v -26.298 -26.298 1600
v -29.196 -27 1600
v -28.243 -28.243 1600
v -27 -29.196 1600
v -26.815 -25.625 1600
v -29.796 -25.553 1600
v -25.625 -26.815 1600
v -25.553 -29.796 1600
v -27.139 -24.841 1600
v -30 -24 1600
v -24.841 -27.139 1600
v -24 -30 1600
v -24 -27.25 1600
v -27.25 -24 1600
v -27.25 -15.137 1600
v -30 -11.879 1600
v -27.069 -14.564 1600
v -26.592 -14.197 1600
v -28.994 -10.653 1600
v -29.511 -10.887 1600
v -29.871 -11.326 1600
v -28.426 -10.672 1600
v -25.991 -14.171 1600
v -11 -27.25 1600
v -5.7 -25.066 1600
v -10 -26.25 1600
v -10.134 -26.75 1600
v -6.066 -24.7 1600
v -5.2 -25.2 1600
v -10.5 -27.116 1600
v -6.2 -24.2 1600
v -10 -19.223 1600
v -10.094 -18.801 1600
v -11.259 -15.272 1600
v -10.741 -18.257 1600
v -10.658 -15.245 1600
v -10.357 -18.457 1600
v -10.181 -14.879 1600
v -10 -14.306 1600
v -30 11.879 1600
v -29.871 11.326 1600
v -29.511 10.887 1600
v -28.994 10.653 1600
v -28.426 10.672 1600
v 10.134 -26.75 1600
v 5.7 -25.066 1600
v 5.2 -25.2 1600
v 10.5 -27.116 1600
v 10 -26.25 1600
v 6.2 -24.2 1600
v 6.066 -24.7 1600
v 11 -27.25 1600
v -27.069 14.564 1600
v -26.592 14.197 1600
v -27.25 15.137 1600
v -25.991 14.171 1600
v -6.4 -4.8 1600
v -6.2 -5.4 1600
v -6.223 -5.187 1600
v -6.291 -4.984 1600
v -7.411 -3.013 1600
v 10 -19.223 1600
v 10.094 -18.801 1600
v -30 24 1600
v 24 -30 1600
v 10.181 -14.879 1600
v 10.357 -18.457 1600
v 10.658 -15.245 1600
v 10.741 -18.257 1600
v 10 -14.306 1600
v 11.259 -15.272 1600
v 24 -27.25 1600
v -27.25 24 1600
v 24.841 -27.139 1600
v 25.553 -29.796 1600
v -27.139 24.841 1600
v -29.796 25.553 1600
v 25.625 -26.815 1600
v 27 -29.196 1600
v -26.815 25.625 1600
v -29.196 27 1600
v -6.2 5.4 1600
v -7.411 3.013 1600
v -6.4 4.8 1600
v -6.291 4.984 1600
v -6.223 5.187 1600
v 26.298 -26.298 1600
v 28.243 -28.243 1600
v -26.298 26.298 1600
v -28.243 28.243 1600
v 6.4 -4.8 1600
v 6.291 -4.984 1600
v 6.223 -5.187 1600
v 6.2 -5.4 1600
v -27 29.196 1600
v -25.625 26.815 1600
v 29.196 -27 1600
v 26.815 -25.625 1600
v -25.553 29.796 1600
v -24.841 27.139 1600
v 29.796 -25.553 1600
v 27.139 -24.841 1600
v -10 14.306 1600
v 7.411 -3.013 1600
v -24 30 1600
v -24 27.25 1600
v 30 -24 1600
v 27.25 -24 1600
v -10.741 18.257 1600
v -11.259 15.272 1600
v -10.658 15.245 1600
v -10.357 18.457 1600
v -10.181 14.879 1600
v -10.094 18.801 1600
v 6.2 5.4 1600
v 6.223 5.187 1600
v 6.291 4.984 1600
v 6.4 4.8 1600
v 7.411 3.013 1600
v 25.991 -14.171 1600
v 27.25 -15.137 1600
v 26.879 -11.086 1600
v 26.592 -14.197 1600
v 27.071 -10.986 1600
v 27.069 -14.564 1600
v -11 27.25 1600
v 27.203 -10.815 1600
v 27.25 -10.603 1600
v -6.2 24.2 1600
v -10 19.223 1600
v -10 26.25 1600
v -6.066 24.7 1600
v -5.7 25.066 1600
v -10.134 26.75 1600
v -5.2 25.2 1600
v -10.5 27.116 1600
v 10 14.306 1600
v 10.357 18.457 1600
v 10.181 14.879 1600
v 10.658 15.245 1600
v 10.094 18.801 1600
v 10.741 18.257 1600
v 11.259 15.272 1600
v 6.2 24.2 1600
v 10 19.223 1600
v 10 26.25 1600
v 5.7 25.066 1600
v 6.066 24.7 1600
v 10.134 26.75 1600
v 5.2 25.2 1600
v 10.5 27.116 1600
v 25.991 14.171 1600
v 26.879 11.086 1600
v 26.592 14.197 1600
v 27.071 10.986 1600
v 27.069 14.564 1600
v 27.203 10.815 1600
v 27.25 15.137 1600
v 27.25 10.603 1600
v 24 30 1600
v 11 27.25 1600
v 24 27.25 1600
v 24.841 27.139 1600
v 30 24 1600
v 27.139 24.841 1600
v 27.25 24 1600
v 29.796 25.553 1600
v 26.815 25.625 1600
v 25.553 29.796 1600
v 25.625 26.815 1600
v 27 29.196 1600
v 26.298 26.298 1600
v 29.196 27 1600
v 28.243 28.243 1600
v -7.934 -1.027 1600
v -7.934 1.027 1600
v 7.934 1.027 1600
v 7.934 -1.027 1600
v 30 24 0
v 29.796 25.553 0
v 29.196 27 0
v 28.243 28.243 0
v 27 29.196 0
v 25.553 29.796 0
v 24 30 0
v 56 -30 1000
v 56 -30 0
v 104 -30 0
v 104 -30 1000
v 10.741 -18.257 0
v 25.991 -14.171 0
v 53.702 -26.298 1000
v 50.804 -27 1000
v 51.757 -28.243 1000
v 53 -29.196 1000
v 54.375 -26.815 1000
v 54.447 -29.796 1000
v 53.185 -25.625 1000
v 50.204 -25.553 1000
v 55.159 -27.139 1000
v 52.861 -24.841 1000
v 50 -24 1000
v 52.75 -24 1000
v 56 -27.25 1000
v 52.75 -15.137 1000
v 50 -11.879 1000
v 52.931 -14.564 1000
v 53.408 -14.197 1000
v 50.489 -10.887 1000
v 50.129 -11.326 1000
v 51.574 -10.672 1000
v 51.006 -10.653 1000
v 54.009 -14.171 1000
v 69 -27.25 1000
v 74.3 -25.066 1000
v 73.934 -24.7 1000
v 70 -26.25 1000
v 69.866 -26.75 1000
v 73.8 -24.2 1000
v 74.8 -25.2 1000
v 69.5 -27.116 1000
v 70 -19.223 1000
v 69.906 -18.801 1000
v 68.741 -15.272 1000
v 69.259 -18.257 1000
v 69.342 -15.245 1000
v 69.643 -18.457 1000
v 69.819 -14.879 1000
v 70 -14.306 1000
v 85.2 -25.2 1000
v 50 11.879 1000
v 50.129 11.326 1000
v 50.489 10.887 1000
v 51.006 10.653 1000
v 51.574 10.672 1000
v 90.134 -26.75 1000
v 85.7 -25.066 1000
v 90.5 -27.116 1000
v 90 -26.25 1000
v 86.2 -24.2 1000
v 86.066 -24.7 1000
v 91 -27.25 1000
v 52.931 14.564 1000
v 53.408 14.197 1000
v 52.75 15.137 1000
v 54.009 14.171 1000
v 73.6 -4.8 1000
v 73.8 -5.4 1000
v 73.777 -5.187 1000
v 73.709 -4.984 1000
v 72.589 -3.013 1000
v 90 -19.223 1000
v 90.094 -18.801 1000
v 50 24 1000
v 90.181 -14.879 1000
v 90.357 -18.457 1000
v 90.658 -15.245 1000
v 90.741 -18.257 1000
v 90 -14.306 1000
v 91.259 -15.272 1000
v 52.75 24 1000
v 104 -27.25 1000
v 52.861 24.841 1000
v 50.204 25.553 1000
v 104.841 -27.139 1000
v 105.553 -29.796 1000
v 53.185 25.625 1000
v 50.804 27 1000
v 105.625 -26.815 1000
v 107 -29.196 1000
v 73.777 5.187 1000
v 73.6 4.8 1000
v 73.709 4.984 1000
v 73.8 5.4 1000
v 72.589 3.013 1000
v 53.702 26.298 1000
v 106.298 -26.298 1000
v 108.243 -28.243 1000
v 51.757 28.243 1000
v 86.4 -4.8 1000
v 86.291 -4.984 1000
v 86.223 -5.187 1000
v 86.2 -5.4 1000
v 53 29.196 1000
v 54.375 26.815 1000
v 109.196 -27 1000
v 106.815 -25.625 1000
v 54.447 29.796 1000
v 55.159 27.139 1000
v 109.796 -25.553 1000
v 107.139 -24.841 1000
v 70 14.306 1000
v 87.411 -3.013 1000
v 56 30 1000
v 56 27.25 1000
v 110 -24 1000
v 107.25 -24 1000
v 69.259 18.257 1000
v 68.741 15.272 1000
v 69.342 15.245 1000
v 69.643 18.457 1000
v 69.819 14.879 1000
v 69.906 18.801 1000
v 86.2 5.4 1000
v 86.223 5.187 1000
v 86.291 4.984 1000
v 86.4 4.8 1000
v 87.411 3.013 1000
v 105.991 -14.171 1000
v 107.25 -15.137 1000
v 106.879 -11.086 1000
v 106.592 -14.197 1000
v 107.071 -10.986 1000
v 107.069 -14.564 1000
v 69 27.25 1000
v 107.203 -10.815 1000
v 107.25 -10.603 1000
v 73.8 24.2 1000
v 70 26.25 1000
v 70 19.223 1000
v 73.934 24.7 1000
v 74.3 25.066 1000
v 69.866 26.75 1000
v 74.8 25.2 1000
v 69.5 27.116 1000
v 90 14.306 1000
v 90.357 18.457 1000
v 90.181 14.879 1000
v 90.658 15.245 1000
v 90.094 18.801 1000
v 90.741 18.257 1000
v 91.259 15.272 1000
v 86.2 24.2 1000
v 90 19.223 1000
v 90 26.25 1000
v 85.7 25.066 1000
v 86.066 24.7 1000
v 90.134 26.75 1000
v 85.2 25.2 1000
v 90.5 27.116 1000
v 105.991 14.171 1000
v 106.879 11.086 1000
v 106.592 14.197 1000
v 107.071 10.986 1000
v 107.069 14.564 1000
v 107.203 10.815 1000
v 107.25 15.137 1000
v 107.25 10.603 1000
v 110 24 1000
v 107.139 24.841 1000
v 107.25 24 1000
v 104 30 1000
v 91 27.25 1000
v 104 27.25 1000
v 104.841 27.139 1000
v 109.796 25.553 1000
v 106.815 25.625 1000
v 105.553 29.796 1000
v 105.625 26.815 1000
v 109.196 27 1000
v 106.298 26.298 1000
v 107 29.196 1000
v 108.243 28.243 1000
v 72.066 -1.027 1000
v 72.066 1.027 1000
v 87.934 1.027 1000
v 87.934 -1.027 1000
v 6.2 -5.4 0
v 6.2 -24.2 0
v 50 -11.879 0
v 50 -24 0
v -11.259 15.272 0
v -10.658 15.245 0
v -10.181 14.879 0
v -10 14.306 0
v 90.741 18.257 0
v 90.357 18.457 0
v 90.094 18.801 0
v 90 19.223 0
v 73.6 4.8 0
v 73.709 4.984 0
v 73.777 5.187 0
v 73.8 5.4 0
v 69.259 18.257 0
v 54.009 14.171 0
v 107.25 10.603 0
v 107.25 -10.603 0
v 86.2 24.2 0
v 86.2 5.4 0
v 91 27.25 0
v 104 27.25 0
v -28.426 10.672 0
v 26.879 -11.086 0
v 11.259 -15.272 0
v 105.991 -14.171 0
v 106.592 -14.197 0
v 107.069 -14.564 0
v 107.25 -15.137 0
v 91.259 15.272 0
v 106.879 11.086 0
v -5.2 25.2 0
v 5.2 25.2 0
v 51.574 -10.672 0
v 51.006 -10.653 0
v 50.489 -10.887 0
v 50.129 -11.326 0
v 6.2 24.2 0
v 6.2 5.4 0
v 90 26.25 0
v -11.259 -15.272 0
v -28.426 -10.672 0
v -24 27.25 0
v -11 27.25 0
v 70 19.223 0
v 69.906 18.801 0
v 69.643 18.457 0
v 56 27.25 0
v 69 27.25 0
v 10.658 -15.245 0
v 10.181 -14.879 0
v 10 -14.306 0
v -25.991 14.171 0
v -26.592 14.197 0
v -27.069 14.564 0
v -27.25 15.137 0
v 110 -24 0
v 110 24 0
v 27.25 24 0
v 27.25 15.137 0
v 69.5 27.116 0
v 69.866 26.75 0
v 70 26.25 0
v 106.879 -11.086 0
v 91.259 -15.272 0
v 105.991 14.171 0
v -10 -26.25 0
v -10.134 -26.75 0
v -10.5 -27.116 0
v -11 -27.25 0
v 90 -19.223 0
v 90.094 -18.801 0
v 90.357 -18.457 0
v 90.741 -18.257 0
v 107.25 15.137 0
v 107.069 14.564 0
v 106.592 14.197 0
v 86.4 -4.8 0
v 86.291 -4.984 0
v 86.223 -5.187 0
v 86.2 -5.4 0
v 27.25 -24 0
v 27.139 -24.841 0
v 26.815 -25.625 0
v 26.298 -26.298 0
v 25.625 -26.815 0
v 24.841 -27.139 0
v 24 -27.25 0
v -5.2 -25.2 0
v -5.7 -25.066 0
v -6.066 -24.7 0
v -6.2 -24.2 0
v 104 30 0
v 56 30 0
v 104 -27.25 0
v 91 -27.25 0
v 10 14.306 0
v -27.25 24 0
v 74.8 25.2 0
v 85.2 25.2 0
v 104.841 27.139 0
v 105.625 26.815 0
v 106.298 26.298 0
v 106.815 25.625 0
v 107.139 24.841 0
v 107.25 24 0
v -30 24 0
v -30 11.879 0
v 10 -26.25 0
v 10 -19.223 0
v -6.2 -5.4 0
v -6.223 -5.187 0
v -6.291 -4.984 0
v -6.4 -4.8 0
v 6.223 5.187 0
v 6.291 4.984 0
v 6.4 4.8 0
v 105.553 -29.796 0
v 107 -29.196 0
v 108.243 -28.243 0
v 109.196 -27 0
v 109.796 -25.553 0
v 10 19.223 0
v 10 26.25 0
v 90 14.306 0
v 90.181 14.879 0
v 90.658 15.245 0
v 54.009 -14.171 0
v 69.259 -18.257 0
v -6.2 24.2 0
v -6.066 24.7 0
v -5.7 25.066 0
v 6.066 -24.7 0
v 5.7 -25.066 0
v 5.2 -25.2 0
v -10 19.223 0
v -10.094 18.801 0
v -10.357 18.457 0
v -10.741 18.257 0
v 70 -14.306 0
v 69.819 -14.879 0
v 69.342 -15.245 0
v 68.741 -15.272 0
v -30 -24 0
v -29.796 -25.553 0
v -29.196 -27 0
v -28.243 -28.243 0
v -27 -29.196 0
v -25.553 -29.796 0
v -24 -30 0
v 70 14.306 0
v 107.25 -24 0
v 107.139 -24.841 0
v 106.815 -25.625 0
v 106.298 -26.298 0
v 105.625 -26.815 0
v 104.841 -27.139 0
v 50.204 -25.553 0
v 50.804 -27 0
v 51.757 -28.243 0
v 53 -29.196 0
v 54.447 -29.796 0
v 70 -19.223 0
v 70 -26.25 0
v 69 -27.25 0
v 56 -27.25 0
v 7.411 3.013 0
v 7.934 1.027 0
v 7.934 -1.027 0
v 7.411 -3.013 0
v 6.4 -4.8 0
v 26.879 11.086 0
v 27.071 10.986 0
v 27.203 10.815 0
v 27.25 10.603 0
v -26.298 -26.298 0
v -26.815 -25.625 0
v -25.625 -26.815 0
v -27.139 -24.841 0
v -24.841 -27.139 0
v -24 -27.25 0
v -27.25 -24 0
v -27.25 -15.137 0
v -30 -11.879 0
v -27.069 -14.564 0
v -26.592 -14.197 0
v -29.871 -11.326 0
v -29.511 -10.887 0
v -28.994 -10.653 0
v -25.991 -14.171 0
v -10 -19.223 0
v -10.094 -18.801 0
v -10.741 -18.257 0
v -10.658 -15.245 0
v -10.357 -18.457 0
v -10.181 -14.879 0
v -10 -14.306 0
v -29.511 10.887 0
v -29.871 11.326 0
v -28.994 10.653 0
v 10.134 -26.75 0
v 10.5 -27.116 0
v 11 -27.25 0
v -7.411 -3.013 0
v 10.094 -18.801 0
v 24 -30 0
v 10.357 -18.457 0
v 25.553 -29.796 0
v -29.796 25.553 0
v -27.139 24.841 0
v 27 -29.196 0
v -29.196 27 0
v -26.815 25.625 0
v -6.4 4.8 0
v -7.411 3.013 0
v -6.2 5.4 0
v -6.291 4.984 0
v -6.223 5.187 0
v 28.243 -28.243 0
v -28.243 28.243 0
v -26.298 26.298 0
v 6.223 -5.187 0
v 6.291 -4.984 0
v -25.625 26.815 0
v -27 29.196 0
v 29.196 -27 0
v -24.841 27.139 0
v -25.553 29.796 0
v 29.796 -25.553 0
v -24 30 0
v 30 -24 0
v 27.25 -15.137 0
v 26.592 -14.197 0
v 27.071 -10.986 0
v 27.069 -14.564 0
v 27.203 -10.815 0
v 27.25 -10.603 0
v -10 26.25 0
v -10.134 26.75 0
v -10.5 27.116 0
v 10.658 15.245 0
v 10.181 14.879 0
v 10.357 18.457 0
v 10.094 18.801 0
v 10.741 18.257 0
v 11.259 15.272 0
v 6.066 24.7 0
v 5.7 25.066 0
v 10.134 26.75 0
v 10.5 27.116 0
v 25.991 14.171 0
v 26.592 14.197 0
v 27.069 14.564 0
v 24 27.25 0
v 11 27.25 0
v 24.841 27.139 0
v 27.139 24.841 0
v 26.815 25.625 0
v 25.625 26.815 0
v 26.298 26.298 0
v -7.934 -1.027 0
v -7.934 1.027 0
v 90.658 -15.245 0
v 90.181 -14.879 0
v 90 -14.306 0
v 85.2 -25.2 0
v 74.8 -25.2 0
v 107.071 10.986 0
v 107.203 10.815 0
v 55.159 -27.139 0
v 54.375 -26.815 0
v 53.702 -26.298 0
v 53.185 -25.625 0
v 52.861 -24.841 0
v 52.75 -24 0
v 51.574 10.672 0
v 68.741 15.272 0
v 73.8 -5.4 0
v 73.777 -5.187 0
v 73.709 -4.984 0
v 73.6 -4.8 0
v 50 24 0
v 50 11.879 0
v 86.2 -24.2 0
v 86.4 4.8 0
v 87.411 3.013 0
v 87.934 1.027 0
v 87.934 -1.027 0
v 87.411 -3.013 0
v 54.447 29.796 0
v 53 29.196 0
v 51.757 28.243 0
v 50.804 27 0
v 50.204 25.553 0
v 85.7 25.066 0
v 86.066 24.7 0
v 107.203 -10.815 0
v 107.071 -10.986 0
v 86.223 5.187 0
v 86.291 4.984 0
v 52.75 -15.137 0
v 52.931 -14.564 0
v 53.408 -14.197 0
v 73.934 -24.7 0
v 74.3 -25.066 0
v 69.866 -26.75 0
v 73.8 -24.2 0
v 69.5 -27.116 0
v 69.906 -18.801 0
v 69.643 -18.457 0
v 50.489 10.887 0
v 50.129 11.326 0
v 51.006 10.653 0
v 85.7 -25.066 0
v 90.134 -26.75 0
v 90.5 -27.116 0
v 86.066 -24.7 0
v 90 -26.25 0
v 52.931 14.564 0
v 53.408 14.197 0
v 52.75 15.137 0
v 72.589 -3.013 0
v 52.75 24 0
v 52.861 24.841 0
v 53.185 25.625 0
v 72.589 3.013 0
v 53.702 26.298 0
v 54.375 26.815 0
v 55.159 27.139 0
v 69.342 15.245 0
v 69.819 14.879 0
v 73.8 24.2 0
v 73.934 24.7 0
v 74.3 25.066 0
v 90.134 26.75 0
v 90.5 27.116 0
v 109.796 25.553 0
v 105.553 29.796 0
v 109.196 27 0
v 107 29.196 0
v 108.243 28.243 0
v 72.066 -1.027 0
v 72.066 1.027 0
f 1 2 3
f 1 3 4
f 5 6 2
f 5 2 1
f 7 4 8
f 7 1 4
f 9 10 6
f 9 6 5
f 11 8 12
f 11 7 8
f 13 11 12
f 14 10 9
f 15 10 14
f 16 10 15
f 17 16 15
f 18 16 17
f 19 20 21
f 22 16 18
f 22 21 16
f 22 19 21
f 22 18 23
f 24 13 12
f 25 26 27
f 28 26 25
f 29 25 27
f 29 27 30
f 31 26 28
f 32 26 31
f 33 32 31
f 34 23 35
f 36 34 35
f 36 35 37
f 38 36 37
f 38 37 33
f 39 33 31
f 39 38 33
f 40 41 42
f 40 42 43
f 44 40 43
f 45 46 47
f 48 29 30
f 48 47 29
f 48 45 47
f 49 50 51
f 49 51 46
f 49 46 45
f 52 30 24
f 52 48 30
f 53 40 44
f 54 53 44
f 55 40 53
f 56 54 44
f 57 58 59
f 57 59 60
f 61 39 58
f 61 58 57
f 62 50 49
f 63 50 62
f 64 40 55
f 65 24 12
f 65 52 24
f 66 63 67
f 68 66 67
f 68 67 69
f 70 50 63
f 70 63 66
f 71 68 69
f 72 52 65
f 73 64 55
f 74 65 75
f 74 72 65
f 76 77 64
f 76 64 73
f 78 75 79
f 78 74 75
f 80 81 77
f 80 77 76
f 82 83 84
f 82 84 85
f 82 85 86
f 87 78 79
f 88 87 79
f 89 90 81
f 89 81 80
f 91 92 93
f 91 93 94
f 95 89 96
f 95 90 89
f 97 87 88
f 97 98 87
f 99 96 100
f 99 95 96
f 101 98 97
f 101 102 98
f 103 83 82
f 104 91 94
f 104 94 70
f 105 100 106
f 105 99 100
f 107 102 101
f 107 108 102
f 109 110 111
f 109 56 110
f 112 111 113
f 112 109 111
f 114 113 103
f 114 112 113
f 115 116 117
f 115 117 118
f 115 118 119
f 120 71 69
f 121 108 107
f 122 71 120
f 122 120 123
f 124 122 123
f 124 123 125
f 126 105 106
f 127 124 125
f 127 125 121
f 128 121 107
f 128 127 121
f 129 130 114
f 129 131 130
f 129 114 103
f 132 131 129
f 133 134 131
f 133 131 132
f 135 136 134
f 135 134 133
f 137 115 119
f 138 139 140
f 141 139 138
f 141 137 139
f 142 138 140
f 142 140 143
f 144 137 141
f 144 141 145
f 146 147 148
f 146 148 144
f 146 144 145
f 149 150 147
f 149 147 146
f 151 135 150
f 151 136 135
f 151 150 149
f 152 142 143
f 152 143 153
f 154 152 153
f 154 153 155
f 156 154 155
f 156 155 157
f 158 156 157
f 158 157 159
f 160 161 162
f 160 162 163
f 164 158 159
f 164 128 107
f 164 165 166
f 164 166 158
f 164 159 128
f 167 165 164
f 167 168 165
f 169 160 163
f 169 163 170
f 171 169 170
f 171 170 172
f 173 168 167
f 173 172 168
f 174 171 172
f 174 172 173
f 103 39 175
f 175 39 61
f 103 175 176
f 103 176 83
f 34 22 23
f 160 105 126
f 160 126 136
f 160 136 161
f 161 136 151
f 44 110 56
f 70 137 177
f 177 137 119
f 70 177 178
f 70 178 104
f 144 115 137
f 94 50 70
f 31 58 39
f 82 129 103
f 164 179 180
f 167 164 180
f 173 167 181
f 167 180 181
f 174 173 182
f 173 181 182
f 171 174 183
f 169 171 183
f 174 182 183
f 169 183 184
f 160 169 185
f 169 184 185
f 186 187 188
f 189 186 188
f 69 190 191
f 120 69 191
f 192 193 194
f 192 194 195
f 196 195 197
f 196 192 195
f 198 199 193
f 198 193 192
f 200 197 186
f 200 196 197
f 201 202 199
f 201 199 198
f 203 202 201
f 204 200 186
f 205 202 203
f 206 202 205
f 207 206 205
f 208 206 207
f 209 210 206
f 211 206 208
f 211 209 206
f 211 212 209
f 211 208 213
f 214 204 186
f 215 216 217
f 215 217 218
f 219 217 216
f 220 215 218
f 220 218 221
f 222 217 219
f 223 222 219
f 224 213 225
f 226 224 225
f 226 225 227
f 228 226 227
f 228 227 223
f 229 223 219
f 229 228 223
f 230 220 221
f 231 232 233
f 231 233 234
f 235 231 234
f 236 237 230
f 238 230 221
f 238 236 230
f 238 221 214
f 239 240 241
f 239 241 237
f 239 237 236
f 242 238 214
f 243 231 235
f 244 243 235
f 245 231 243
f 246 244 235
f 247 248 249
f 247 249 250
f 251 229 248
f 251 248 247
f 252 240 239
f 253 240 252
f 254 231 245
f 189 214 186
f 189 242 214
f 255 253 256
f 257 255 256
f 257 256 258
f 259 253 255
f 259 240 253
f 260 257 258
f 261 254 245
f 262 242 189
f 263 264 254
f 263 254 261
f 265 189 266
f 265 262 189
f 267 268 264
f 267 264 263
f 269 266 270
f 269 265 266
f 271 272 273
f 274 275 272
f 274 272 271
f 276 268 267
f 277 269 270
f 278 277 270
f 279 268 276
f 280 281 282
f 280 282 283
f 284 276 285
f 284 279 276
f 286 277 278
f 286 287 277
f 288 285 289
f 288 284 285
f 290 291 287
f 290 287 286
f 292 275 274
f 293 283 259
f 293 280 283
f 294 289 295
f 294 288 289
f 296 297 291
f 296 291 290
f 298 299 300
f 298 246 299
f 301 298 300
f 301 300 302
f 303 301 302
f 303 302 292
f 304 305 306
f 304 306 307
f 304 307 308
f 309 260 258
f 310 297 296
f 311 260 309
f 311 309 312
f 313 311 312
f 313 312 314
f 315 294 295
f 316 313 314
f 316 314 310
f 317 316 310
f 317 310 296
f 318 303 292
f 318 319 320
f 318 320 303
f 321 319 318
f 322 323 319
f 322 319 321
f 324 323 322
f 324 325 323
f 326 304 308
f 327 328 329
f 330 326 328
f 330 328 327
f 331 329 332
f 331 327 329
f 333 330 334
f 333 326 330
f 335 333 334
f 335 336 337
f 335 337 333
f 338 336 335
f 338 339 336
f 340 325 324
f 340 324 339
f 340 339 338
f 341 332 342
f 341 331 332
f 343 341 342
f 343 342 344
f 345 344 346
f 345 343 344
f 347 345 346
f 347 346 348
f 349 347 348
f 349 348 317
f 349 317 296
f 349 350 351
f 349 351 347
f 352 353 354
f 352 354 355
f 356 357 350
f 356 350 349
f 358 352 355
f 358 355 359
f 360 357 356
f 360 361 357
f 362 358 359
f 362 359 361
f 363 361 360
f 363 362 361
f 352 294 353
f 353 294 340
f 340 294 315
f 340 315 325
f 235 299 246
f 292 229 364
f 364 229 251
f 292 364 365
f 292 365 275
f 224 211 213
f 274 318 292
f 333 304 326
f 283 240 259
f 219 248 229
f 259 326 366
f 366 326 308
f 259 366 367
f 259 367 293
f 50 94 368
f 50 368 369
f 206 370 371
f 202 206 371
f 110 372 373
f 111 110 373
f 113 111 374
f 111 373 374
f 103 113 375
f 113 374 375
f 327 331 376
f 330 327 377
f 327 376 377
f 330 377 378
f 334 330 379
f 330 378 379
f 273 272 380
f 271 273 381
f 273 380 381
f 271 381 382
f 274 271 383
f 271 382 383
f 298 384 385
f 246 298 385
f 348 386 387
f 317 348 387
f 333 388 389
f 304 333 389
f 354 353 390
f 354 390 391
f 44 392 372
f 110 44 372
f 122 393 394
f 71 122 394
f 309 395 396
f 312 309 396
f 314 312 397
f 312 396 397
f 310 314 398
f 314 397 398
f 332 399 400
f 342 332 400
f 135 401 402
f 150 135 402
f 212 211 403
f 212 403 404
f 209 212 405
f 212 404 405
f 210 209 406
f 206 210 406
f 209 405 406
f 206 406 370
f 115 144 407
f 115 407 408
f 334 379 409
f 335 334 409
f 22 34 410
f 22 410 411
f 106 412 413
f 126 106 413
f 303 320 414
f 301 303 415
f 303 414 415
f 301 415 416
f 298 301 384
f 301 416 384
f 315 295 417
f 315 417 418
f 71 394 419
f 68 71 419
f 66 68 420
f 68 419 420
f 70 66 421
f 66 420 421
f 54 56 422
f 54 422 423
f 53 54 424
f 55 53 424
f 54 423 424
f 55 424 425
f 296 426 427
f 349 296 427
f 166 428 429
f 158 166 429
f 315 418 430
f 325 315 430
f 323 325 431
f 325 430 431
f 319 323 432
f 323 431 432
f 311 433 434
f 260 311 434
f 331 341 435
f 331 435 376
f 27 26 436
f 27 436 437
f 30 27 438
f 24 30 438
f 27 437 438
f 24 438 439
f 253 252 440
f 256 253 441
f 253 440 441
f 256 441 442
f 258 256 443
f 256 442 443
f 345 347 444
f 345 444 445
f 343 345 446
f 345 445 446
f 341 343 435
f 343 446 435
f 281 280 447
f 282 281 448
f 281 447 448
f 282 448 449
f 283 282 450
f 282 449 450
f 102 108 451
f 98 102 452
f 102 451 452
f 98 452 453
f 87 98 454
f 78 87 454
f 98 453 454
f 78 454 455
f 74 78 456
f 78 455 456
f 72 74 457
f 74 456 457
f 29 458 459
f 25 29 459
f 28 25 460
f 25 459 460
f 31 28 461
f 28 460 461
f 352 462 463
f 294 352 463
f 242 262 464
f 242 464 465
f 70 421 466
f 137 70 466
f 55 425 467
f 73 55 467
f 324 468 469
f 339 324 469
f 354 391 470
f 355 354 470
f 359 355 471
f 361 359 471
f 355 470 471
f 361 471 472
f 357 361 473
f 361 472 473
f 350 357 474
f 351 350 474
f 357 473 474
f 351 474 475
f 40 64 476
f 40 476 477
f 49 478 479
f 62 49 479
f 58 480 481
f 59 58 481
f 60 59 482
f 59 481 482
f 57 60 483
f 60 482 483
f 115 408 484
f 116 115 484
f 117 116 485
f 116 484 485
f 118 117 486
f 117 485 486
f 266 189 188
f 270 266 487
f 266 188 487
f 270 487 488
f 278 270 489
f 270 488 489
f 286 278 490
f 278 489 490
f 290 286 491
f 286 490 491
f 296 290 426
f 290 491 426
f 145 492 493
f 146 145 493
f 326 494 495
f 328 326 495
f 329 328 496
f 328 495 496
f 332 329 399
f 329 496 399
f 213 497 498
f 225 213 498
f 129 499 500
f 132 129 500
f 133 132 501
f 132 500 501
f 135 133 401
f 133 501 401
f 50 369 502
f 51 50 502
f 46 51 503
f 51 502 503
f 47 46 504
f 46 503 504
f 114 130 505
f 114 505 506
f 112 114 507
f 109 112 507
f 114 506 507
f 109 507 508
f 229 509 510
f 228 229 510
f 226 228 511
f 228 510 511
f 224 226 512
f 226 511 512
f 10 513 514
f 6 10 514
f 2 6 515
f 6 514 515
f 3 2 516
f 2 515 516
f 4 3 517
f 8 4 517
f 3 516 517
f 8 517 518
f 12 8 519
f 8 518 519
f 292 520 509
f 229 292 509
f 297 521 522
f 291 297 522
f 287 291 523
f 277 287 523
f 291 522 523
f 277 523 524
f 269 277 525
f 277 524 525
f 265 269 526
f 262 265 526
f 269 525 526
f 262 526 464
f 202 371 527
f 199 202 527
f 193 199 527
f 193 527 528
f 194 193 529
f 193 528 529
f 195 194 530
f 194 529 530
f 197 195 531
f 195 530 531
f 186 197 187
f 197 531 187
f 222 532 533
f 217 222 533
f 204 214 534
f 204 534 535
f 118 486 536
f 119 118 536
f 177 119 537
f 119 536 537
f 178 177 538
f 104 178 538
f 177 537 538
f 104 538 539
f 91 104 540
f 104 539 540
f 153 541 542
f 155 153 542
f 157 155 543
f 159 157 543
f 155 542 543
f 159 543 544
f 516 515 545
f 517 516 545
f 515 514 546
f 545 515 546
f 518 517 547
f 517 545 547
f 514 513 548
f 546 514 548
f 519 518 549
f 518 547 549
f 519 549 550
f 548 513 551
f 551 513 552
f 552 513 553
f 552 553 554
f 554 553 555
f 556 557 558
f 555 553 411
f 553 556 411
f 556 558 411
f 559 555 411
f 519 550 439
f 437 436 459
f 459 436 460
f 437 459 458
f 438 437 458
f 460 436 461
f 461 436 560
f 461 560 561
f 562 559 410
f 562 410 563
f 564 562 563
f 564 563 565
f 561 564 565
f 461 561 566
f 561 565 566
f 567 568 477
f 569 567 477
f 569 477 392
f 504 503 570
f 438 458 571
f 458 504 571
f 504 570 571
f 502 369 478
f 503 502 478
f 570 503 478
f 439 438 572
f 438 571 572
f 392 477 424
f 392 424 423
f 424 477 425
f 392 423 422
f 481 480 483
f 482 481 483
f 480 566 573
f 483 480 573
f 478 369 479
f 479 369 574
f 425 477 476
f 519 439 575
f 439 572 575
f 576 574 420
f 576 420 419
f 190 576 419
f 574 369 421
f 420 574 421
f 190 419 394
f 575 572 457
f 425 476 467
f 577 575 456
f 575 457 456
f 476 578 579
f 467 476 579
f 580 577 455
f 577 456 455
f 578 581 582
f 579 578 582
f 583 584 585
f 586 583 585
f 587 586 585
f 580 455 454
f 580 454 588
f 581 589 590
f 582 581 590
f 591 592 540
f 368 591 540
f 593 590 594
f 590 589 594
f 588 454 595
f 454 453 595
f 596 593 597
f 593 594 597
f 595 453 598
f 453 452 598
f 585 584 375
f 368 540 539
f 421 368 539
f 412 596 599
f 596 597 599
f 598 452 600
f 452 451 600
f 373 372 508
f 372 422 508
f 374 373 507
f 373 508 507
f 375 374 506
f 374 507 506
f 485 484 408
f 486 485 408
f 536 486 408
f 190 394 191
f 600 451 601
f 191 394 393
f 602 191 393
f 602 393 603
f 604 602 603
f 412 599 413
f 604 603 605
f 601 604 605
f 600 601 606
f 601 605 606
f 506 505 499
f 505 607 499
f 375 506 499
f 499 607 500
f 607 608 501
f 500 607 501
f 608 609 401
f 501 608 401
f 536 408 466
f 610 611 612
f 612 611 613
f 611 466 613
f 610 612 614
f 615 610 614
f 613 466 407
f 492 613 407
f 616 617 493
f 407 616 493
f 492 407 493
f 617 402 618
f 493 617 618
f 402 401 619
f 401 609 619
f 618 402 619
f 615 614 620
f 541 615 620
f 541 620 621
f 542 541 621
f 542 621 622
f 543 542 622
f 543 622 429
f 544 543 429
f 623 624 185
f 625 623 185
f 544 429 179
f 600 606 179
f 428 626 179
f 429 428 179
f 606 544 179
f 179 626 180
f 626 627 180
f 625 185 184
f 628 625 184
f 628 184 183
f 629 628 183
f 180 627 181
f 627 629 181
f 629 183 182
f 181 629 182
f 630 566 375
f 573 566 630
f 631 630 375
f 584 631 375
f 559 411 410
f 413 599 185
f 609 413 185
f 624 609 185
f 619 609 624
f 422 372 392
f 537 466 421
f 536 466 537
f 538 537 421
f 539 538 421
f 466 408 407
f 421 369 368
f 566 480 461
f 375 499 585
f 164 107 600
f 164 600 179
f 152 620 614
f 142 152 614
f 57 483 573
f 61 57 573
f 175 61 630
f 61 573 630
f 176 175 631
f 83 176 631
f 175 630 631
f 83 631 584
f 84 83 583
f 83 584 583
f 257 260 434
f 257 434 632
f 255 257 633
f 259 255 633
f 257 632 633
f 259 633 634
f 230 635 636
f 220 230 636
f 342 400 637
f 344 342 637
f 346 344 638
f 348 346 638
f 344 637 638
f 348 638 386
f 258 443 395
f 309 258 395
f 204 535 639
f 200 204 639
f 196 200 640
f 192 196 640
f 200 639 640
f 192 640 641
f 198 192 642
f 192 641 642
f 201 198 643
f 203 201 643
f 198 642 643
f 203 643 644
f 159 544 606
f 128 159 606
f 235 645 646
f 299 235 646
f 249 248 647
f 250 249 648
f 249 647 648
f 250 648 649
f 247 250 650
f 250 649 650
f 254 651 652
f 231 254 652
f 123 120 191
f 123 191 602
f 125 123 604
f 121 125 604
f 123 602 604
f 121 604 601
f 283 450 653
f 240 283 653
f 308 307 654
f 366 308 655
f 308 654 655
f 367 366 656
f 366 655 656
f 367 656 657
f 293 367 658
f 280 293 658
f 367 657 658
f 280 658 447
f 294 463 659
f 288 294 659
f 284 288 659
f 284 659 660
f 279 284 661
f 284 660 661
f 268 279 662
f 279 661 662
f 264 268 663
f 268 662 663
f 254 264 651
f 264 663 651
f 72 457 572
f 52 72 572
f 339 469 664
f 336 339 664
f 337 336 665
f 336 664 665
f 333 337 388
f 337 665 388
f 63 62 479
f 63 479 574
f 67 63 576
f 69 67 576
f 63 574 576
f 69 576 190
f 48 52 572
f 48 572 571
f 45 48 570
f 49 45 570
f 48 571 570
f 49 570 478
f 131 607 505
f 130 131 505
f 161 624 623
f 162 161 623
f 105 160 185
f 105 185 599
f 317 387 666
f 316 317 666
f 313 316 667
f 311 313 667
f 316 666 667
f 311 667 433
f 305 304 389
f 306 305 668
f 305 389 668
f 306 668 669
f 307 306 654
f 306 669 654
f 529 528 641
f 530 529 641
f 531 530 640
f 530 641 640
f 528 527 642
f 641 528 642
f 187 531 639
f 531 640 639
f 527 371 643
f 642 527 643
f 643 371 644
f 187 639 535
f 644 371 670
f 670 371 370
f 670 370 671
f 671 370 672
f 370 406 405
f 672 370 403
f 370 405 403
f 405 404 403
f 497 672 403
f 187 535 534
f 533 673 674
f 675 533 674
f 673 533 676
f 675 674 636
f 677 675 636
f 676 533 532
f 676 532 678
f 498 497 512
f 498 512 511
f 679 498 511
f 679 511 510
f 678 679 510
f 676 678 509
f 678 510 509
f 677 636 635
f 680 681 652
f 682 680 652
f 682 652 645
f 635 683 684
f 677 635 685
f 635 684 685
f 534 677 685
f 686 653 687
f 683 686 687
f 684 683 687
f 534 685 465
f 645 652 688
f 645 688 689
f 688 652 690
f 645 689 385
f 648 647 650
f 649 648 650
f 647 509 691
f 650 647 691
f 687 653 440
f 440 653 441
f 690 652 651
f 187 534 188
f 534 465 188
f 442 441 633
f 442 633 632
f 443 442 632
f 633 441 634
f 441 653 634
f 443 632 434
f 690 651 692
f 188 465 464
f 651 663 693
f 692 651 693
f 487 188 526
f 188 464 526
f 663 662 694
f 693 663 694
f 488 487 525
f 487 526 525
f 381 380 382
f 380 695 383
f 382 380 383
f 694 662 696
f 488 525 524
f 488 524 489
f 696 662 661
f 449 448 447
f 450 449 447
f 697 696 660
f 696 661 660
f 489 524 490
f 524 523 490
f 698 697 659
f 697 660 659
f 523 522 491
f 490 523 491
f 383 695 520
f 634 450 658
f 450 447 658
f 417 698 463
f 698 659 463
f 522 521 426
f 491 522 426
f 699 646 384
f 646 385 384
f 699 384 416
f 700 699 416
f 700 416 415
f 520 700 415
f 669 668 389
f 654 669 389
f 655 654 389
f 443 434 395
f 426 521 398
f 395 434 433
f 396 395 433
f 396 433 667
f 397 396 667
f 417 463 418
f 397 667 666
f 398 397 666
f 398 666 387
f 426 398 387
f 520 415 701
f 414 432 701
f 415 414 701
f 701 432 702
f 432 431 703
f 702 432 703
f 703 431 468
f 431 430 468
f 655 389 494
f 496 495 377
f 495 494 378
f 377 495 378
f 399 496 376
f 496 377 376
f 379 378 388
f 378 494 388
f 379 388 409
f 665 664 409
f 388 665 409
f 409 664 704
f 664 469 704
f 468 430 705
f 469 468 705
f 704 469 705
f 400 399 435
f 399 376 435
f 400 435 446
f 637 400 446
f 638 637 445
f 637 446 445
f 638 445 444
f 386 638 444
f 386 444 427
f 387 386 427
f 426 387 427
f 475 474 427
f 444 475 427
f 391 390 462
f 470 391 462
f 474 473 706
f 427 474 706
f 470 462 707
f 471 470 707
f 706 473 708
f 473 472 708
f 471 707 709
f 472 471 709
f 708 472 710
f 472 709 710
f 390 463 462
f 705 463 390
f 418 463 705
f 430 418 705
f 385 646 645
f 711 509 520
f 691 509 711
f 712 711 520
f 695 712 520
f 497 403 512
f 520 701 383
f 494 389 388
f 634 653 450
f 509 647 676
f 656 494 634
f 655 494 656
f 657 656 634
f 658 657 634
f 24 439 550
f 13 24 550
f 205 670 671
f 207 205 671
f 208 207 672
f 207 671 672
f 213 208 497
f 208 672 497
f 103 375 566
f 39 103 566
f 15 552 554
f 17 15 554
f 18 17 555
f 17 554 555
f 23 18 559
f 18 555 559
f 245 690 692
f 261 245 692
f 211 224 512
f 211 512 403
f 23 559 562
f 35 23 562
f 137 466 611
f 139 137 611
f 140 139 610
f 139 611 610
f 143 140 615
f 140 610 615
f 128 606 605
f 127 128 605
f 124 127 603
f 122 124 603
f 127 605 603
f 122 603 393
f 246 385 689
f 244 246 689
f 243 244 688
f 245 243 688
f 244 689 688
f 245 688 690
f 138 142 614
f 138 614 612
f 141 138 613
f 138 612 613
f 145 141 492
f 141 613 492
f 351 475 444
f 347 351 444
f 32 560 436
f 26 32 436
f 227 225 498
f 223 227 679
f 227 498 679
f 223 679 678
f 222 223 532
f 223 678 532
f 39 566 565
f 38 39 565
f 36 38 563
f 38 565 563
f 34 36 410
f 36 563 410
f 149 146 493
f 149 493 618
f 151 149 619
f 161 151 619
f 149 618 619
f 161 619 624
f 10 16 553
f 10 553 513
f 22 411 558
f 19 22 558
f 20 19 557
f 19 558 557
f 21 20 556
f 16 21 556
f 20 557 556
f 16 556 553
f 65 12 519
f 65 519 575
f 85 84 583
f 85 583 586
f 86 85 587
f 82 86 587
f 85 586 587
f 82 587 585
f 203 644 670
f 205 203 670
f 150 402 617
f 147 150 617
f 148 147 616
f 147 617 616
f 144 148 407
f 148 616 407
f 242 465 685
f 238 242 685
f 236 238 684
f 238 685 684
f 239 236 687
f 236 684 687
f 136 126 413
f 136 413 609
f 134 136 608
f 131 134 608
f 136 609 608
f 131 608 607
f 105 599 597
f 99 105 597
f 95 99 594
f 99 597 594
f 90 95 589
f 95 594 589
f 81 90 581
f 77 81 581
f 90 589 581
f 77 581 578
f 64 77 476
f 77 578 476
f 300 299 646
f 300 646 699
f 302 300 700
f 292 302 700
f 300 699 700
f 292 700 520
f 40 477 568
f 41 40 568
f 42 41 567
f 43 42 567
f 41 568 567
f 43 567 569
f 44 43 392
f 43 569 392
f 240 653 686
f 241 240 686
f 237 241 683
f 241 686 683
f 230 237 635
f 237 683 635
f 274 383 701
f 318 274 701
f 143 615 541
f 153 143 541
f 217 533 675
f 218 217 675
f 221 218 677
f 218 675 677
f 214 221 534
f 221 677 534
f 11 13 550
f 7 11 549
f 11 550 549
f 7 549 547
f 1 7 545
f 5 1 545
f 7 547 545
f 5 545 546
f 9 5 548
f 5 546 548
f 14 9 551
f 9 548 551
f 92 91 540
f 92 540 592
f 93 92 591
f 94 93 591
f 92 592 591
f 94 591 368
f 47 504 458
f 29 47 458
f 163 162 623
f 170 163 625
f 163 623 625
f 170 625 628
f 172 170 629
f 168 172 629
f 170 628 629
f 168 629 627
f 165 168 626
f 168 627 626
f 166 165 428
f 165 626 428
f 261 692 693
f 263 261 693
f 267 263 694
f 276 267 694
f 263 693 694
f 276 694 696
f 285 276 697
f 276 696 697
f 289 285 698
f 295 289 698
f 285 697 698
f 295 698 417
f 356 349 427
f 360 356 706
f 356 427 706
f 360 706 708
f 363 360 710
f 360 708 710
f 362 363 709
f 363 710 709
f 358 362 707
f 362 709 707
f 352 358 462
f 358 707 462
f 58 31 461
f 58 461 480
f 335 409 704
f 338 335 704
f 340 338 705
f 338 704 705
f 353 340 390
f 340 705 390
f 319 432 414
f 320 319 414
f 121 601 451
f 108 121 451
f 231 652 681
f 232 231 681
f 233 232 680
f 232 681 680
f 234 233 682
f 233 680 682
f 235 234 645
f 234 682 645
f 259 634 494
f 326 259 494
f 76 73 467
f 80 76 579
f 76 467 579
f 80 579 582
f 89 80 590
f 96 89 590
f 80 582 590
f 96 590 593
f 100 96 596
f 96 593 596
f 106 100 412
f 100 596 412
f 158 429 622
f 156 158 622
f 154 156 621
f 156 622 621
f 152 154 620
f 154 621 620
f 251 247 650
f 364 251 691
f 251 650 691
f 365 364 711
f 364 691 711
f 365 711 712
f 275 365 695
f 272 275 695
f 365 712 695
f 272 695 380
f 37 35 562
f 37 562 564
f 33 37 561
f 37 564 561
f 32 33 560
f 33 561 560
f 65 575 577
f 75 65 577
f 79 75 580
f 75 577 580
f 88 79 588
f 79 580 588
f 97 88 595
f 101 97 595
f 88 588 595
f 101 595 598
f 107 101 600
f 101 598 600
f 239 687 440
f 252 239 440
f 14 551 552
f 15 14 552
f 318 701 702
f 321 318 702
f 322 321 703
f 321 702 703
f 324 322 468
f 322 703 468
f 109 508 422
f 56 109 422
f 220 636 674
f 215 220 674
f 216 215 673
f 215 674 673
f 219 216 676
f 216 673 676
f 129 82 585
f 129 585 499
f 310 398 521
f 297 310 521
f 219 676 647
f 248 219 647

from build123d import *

# Parameters (mm, degrees)
F1_DEPTH = 1600
F2_DEPTH = 1000


# Not quite as in the source:
# - ends of sketch curves that miss each other by under 0.0002 mm in the source are joined


with BuildPart() as f1:
    # F0 (on Top) → F1 (new body)
    with BuildSketch(Plane.XY):
        with BuildLine():
            ThreePointArc((-11.2588189596, 15.2716838492), (-10.3912385359, 15.0991113133), (-10, 14.305758))
            Line((-10, 14.305758), (-10, -14.305758))
            ThreePointArc((-10, -14.305758), (-10.3912385359, -15.0991113133), (-11.2588189596, -15.2716838492))
            Line((-11.2588189596, -15.2716838492), (-28.426476, -10.671624))
            ThreePointArc((-28.426476, -10.671624), (-29.5109517857, -10.8873403242), (-30, -11.879032))
            Line((-30, -11.879032), (-30, -24))
            ThreePointArc((-30, -24), (-28.2426406871, -28.2426406871), (-24, -30))
            Line((-24, -30), (24, -30))
            ThreePointArc((24, -30), (28.2426406871, -28.2426406871), (30, -24))
            Line((30, -24), (30, 24))
            ThreePointArc((30, 24), (28.2426406871, 28.2426406871), (24, 30))
            Line((24, 30), (-24, 30))
            ThreePointArc((-24, 30), (-28.2426406871, 28.2426406871), (-30, 24))
            Line((-30, 24), (-30, 11.879032))
            ThreePointArc((-30, 11.879032), (-29.5109517857, 10.8873403242), (-28.4264761923, 10.6716247175))
            Line((-28.4264761923, 10.6716247175), (-11.2588189596, 15.2716838492))
        make_face()
        with BuildLine():
            Line((-11, -27.25), (-24, -27.25))
            ThreePointArc((-24, -27.25), (-26.2980970389, -26.2980970389), (-27.25, -24))
            Line((-27.25, -24), (-27.25, -15.137095))
            ThreePointArc((-27.25, -15.137095), (-26.8587614641, -14.3437416867), (-25.9911810404, -14.1711691508))
            Line((-25.9911810404, -14.1711691508), (-10.741181, -18.257395))
            ThreePointArc((-10.741181, -18.257395), (-10.2066466079, -18.6145586385), (-10, -19.22332))
            Line((-10, -19.22332), (-10, -26.25))
            ThreePointArc((-10, -26.25), (-10.2928932188, -26.9571067812), (-11, -27.25))
        make_face(mode=Mode.SUBTRACT)
        with BuildLine():
            Line((10.741181, -18.257395), (25.991181, -14.171169))
            ThreePointArc((25.991181, -14.171169), (26.8587614641, -14.3437416867), (27.25, -15.137095))
            Line((27.25, -15.137095), (27.25, -24))
            ThreePointArc((27.25, -24), (26.2980970389, -26.2980970389), (24, -27.25))
            Line((24, -27.25), (11, -27.25))
            ThreePointArc((11, -27.25), (10.2928932188, -26.9571067812), (10, -26.25))
            Line((10, -26.25), (10, -19.22332))
            ThreePointArc((10, -19.22332), (10.2066466079, -18.6145586385), (10.741181, -18.257395))
        make_face(mode=Mode.SUBTRACT)
        with BuildLine():
            Line((-5.2, 25.2), (5.2, 25.2))
            ThreePointArc((5.2, 25.2), (5.9071067812, 24.9071067812), (6.2, 24.2))
            Line((6.2, 24.2), (6.2, 5.4))
            ThreePointArc((6.2, 5.4), (6.2513167019, 5.083772234), (6.4, 4.8))
            ThreePointArc((6.4, 4.8), (8, 0), (6.4, -4.8))
            ThreePointArc((6.4, -4.8), (6.2513167019, -5.083772234), (6.2, -5.4))
            Line((6.2, -5.4), (6.2, -24.2))
            ThreePointArc((6.2, -24.2), (5.9071067812, -24.9071067812), (5.2, -25.2))
            Line((5.2, -25.2), (-5.2, -25.2))
            ThreePointArc((-5.2, -25.2), (-5.9071067812, -24.9071067812), (-6.2, -24.2))
            Line((-6.2, -24.2), (-6.2, -5.4))
            ThreePointArc((-6.2, -5.4), (-6.2513167019, -5.083772234), (-6.4, -4.8))
            ThreePointArc((-6.4, -4.8), (-8, 0), (-6.4, 4.8))
            ThreePointArc((-6.4, 4.8), (-6.2513167019, 5.083772234), (-6.2, 5.4))
            Line((-6.2, 5.4), (-6.2, 24.2))
            ThreePointArc((-6.2, 24.2), (-5.9071067812, 24.9071067812), (-5.2, 25.2))
        make_face(mode=Mode.SUBTRACT)
        with BuildLine():
            Line((26.87941, -11.08616), (11.258819, -15.271684))
            ThreePointArc((11.258819, -15.271684), (10.3912385359, -15.0991113133), (10, -14.305758))
            Line((10, -14.305758), (10, 14.305758))
            ThreePointArc((10, 14.305758), (10.3912385359, 15.0991113133), (11.2588189596, 15.2716838492))
            Line((11.2588189596, 15.2716838492), (26.87941, 11.08616))
            ThreePointArc((26.87941, 11.08616), (27.1466768037, 10.9075775405), (27.25, 10.603197))
            Line((27.25, 10.603197), (27.25, -10.603197))
            ThreePointArc((27.25, -10.603197), (27.1466768037, -10.9075775405), (26.87941, -11.08616))
        make_face(mode=Mode.SUBTRACT)
        with BuildLine():
            Line((-10.741181, 18.257395), (-25.991181, 14.171169))
            ThreePointArc((-25.991181, 14.171169), (-26.8587614641, 14.3437416867), (-27.25, 15.137095))
            Line((-27.25, 15.137095), (-27.25, 24))
            ThreePointArc((-27.25, 24), (-26.2980970389, 26.2980970389), (-24, 27.25))
            Line((-24, 27.25), (-11, 27.25))
            ThreePointArc((-11, 27.25), (-10.2928932188, 26.9571067812), (-10, 26.25))
            Line((-10, 26.25), (-10, 19.22332))
            ThreePointArc((-10, 19.22332), (-10.2066466079, 18.6145586385), (-10.741181, 18.257395))
        make_face(mode=Mode.SUBTRACT)
        with BuildLine():
            Line((11, 27.25), (24, 27.25))
            ThreePointArc((24, 27.25), (26.2980970389, 26.2980970389), (27.25, 24))
            Line((27.25, 24), (27.25, 15.137095))
            ThreePointArc((27.25, 15.137095), (26.8587614641, 14.3437416867), (25.9911810404, 14.1711691508))
            Line((25.9911810404, 14.1711691508), (10.741181, 18.257395))
            ThreePointArc((10.741181, 18.257395), (10.2066466079, 18.6145586385), (10, 19.22332))
            Line((10, 19.22332), (10, 26.25))
            ThreePointArc((10, 26.25), (10.2928932188, 26.9571067812), (11, 27.25))
        make_face(mode=Mode.SUBTRACT)
    extrude(amount=F1_DEPTH)


with BuildPart() as f2:
    # F0 (on Top) → F2 (new body)
    with BuildSketch(Plane.XY):
        with BuildLine():
            Line((50, -11.879032), (50, -24))
            ThreePointArc((50, -24), (51.7573593129, -28.2426406871), (56, -30))
            Line((56, -30), (104, -30))
            ThreePointArc((104, -30), (108.2426406871, -28.2426406871), (110, -24))
            Line((110, -24), (110, 24))
            ThreePointArc((110, 24), (108.2426406871, 28.2426406871), (104, 30))
            Line((104, 30), (56, 30))
            ThreePointArc((56, 30), (51.7573593129, 28.2426406871), (50, 24))
            Line((50, 24), (50, 11.879032))
            ThreePointArc((50, 11.879032), (50.4890482143, 10.8873403242), (51.5735238077, 10.6716247175))
            Line((51.5735238077, 10.6716247175), (68.741181, 15.271684))
            ThreePointArc((68.741181, 15.271684), (69.6087614641, 15.0991113133), (70, 14.305758))
            Line((70, 14.305758), (70, -14.305758))
            ThreePointArc((70, -14.305758), (69.6087614641, -15.0991113133), (68.7411810404, -15.2716838492))
            Line((68.7411810404, -15.2716838492), (51.573524, -10.671624))
            ThreePointArc((51.573524, -10.671624), (50.4890482143, -10.8873403242), (50, -11.879032))
        make_face()
        with BuildLine():
            Line((52.75, -24), (52.75, -15.137095))
            ThreePointArc((52.75, -15.137095), (53.1412385359, -14.3437416867), (54.0088189596, -14.1711691508))
            Line((54.0088189596, -14.1711691508), (69.258819, -18.257395))
            ThreePointArc((69.258819, -18.257395), (69.7933533921, -18.6145586385), (70, -19.22332))
            Line((70, -19.22332), (70, -26.25))
            ThreePointArc((70, -26.25), (69.7071067812, -26.9571067812), (69, -27.25))
            Line((69, -27.25), (56, -27.25))
            ThreePointArc((56, -27.25), (53.7019029611, -26.2980970389), (52.75, -24))
        make_face(mode=Mode.SUBTRACT)
        with BuildLine():
            ThreePointArc((107.25, -24), (106.2980970389, -26.2980970389), (104, -27.25))
            Line((104, -27.25), (91, -27.25))
            ThreePointArc((91, -27.25), (90.2928932188, -26.9571067812), (90, -26.25))
            Line((90, -26.25), (90, -19.22332))
            ThreePointArc((90, -19.22332), (90.2066466079, -18.6145586385), (90.7411807904, -18.2573942178))
            Line((90.7411807904, -18.2573942178), (105.991181, -14.171169))
            ThreePointArc((105.991181, -14.171169), (106.8587614641, -14.3437416867), (107.25, -15.137095))
            Line((107.25, -15.137095), (107.25, -24))
        make_face(mode=Mode.SUBTRACT)
        with BuildLine():
            Line((73.8, 5.4), (73.8, 24.2))
            ThreePointArc((73.8, 24.2), (74.0928932188, 24.9071067812), (74.8, 25.2))
            Line((74.8, 25.2), (85.2, 25.2))
            ThreePointArc((85.2, 25.2), (85.9071067812, 24.9071067812), (86.2, 24.2))
            Line((86.2, 24.2), (86.2, 5.4))
            ThreePointArc((86.2, 5.4), (86.2513167019, 5.083772234), (86.4, 4.8))
            ThreePointArc((86.4, 4.8), (88, 0), (86.4, -4.8))
            ThreePointArc((86.4, -4.8), (86.2513167019, -5.083772234), (86.2, -5.4))
            Line((86.2, -5.4), (86.2, -24.2))
            ThreePointArc((86.2, -24.2), (85.9071067812, -24.9071067812), (85.2, -25.2))
            Line((85.2, -25.2), (74.8, -25.2))
            ThreePointArc((74.8, -25.2), (74.0928932188, -24.9071067812), (73.8, -24.2))
            Line((73.8, -24.2), (73.8, -5.4))
            ThreePointArc((73.8, -5.4), (73.7486832981, -5.083772234), (73.6, -4.8))
            ThreePointArc((73.6, -4.8), (72, 0), (73.6, 4.8))
            ThreePointArc((73.6, 4.8), (73.7486832981, 5.083772234), (73.8, 5.4))
        make_face(mode=Mode.SUBTRACT)
        with BuildLine():
            Line((106.87941, -11.08616), (91.258819, -15.271684))
            ThreePointArc((91.258819, -15.271684), (90.3912385359, -15.0991113133), (90, -14.305758))
            Line((90, -14.305758), (90, 14.305758))
            ThreePointArc((90, 14.305758), (90.3912385359, 15.0991113133), (91.2588189596, 15.2716838492))
            Line((91.2588189596, 15.2716838492), (106.87941, 11.08616))
            ThreePointArc((106.87941, 11.08616), (107.1466768037, 10.9075775405), (107.25, 10.603197))
            Line((107.25, 10.603197), (107.25, -10.603197))
            ThreePointArc((107.25, -10.603197), (107.1466768037, -10.9075775405), (106.87941, -11.08616))
        make_face(mode=Mode.SUBTRACT)
        with BuildLine():
            ThreePointArc((52.75, 24), (53.7019029611, 26.2980970389), (56, 27.25))
            Line((56, 27.25), (69, 27.25))
            ThreePointArc((69, 27.25), (69.7071067812, 26.9571067812), (70, 26.25))
            Line((70, 26.25), (70, 19.22332))
            ThreePointArc((70, 19.22332), (69.7933533921, 18.6145586385), (69.2588192096, 18.2573942178))
            Line((69.2588192096, 18.2573942178), (54.008819, 14.171169))
            ThreePointArc((54.008819, 14.171169), (53.1412385359, 14.3437416867), (52.75, 15.137095))
            Line((52.75, 15.137095), (52.75, 24))
        make_face(mode=Mode.SUBTRACT)
        with BuildLine():
            ThreePointArc((104, 27.25), (106.2980970389, 26.2980970389), (107.25, 24))
            Line((107.25, 24), (107.25, 15.137095))
            ThreePointArc((107.25, 15.137095), (106.8587614641, 14.3437416867), (105.9911810404, 14.1711691508))
            Line((105.9911810404, 14.1711691508), (90.741181, 18.257395))
            ThreePointArc((90.741181, 18.257395), (90.2066466079, 18.6145586385), (90, 19.22332))
            Line((90, 19.22332), (90, 26.25))
            ThreePointArc((90, 26.25), (90.2928932188, 26.9571067812), (91, 27.25))
            Line((91, 27.25), (104, 27.25))
        make_face(mode=Mode.SUBTRACT)
    extrude(amount=F2_DEPTH)


solid = Compound([f1.part, f2.part])
